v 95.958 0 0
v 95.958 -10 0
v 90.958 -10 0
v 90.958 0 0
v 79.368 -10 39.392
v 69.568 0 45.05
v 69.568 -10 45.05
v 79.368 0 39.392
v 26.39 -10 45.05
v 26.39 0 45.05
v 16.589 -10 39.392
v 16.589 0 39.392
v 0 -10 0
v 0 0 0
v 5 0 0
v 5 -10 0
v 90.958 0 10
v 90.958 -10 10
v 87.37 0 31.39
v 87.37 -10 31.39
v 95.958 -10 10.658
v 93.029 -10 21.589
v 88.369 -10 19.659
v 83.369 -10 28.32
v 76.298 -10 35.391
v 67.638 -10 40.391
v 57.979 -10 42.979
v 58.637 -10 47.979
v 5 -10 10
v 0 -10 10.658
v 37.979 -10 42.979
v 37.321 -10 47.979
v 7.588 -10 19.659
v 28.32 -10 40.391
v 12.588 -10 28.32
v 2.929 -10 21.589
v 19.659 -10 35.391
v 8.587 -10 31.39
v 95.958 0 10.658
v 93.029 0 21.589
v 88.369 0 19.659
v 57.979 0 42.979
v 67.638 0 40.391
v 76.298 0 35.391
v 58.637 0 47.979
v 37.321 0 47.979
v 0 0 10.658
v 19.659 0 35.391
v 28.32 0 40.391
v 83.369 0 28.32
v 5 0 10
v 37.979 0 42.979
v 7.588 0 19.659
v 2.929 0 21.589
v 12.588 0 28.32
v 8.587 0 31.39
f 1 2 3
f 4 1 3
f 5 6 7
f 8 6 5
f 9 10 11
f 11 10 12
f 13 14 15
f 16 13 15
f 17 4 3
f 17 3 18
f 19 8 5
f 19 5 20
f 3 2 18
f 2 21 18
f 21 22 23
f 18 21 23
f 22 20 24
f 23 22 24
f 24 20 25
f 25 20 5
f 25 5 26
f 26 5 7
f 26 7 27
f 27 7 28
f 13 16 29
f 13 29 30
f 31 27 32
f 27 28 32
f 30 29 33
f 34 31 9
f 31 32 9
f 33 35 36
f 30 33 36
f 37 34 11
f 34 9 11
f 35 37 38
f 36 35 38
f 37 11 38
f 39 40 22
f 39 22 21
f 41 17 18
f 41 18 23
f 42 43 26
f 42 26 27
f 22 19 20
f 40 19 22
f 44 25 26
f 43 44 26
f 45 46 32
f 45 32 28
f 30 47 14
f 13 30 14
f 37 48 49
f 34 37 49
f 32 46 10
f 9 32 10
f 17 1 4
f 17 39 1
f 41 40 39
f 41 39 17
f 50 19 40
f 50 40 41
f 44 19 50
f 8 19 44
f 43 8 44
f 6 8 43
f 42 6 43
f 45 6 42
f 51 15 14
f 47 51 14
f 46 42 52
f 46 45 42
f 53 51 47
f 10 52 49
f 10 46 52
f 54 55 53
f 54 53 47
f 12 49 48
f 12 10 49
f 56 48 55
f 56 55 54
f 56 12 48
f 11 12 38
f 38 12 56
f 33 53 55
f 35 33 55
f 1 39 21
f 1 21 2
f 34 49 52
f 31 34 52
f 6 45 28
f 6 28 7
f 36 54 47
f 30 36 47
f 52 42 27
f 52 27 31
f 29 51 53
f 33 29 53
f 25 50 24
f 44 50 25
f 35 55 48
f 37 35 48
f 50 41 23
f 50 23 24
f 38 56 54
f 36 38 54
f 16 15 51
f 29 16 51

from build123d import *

# Parameters (mm, degrees)
F1_DEPTH = 10


with BuildPart() as f1:
    # F0 (on Front) → F1 (new body)
    with BuildSketch(Plane.XZ):
        Polygon((0, 0), (5.000002, 0), (5.000002, 10), (7.588192, 19.659258), (12.588192, 28.319512), (19.65926, 35.39058), (28.319514, 40.39058), (37.978773, 42.978771), (47.978773, 42.978771), (47.978773, 47.978773), (37.32051, 47.978773), (26.389586, 45.04984), (16.589187, 39.391577), (8.587195, 31.389586), (2.928932, 21.589187), (0, 10.658263), align=None)
    extrude(amount=F1_DEPTH)

    # F2: F1 across face


with BuildPart() as f1_1:
    add(f1.part)
    add(f1.part.mirror(Plane(origin=(47.978773, -5, 45.478772), x_dir=(0, 1, 0), z_dir=(1, 0, 0))))


solid = f1_1.part
